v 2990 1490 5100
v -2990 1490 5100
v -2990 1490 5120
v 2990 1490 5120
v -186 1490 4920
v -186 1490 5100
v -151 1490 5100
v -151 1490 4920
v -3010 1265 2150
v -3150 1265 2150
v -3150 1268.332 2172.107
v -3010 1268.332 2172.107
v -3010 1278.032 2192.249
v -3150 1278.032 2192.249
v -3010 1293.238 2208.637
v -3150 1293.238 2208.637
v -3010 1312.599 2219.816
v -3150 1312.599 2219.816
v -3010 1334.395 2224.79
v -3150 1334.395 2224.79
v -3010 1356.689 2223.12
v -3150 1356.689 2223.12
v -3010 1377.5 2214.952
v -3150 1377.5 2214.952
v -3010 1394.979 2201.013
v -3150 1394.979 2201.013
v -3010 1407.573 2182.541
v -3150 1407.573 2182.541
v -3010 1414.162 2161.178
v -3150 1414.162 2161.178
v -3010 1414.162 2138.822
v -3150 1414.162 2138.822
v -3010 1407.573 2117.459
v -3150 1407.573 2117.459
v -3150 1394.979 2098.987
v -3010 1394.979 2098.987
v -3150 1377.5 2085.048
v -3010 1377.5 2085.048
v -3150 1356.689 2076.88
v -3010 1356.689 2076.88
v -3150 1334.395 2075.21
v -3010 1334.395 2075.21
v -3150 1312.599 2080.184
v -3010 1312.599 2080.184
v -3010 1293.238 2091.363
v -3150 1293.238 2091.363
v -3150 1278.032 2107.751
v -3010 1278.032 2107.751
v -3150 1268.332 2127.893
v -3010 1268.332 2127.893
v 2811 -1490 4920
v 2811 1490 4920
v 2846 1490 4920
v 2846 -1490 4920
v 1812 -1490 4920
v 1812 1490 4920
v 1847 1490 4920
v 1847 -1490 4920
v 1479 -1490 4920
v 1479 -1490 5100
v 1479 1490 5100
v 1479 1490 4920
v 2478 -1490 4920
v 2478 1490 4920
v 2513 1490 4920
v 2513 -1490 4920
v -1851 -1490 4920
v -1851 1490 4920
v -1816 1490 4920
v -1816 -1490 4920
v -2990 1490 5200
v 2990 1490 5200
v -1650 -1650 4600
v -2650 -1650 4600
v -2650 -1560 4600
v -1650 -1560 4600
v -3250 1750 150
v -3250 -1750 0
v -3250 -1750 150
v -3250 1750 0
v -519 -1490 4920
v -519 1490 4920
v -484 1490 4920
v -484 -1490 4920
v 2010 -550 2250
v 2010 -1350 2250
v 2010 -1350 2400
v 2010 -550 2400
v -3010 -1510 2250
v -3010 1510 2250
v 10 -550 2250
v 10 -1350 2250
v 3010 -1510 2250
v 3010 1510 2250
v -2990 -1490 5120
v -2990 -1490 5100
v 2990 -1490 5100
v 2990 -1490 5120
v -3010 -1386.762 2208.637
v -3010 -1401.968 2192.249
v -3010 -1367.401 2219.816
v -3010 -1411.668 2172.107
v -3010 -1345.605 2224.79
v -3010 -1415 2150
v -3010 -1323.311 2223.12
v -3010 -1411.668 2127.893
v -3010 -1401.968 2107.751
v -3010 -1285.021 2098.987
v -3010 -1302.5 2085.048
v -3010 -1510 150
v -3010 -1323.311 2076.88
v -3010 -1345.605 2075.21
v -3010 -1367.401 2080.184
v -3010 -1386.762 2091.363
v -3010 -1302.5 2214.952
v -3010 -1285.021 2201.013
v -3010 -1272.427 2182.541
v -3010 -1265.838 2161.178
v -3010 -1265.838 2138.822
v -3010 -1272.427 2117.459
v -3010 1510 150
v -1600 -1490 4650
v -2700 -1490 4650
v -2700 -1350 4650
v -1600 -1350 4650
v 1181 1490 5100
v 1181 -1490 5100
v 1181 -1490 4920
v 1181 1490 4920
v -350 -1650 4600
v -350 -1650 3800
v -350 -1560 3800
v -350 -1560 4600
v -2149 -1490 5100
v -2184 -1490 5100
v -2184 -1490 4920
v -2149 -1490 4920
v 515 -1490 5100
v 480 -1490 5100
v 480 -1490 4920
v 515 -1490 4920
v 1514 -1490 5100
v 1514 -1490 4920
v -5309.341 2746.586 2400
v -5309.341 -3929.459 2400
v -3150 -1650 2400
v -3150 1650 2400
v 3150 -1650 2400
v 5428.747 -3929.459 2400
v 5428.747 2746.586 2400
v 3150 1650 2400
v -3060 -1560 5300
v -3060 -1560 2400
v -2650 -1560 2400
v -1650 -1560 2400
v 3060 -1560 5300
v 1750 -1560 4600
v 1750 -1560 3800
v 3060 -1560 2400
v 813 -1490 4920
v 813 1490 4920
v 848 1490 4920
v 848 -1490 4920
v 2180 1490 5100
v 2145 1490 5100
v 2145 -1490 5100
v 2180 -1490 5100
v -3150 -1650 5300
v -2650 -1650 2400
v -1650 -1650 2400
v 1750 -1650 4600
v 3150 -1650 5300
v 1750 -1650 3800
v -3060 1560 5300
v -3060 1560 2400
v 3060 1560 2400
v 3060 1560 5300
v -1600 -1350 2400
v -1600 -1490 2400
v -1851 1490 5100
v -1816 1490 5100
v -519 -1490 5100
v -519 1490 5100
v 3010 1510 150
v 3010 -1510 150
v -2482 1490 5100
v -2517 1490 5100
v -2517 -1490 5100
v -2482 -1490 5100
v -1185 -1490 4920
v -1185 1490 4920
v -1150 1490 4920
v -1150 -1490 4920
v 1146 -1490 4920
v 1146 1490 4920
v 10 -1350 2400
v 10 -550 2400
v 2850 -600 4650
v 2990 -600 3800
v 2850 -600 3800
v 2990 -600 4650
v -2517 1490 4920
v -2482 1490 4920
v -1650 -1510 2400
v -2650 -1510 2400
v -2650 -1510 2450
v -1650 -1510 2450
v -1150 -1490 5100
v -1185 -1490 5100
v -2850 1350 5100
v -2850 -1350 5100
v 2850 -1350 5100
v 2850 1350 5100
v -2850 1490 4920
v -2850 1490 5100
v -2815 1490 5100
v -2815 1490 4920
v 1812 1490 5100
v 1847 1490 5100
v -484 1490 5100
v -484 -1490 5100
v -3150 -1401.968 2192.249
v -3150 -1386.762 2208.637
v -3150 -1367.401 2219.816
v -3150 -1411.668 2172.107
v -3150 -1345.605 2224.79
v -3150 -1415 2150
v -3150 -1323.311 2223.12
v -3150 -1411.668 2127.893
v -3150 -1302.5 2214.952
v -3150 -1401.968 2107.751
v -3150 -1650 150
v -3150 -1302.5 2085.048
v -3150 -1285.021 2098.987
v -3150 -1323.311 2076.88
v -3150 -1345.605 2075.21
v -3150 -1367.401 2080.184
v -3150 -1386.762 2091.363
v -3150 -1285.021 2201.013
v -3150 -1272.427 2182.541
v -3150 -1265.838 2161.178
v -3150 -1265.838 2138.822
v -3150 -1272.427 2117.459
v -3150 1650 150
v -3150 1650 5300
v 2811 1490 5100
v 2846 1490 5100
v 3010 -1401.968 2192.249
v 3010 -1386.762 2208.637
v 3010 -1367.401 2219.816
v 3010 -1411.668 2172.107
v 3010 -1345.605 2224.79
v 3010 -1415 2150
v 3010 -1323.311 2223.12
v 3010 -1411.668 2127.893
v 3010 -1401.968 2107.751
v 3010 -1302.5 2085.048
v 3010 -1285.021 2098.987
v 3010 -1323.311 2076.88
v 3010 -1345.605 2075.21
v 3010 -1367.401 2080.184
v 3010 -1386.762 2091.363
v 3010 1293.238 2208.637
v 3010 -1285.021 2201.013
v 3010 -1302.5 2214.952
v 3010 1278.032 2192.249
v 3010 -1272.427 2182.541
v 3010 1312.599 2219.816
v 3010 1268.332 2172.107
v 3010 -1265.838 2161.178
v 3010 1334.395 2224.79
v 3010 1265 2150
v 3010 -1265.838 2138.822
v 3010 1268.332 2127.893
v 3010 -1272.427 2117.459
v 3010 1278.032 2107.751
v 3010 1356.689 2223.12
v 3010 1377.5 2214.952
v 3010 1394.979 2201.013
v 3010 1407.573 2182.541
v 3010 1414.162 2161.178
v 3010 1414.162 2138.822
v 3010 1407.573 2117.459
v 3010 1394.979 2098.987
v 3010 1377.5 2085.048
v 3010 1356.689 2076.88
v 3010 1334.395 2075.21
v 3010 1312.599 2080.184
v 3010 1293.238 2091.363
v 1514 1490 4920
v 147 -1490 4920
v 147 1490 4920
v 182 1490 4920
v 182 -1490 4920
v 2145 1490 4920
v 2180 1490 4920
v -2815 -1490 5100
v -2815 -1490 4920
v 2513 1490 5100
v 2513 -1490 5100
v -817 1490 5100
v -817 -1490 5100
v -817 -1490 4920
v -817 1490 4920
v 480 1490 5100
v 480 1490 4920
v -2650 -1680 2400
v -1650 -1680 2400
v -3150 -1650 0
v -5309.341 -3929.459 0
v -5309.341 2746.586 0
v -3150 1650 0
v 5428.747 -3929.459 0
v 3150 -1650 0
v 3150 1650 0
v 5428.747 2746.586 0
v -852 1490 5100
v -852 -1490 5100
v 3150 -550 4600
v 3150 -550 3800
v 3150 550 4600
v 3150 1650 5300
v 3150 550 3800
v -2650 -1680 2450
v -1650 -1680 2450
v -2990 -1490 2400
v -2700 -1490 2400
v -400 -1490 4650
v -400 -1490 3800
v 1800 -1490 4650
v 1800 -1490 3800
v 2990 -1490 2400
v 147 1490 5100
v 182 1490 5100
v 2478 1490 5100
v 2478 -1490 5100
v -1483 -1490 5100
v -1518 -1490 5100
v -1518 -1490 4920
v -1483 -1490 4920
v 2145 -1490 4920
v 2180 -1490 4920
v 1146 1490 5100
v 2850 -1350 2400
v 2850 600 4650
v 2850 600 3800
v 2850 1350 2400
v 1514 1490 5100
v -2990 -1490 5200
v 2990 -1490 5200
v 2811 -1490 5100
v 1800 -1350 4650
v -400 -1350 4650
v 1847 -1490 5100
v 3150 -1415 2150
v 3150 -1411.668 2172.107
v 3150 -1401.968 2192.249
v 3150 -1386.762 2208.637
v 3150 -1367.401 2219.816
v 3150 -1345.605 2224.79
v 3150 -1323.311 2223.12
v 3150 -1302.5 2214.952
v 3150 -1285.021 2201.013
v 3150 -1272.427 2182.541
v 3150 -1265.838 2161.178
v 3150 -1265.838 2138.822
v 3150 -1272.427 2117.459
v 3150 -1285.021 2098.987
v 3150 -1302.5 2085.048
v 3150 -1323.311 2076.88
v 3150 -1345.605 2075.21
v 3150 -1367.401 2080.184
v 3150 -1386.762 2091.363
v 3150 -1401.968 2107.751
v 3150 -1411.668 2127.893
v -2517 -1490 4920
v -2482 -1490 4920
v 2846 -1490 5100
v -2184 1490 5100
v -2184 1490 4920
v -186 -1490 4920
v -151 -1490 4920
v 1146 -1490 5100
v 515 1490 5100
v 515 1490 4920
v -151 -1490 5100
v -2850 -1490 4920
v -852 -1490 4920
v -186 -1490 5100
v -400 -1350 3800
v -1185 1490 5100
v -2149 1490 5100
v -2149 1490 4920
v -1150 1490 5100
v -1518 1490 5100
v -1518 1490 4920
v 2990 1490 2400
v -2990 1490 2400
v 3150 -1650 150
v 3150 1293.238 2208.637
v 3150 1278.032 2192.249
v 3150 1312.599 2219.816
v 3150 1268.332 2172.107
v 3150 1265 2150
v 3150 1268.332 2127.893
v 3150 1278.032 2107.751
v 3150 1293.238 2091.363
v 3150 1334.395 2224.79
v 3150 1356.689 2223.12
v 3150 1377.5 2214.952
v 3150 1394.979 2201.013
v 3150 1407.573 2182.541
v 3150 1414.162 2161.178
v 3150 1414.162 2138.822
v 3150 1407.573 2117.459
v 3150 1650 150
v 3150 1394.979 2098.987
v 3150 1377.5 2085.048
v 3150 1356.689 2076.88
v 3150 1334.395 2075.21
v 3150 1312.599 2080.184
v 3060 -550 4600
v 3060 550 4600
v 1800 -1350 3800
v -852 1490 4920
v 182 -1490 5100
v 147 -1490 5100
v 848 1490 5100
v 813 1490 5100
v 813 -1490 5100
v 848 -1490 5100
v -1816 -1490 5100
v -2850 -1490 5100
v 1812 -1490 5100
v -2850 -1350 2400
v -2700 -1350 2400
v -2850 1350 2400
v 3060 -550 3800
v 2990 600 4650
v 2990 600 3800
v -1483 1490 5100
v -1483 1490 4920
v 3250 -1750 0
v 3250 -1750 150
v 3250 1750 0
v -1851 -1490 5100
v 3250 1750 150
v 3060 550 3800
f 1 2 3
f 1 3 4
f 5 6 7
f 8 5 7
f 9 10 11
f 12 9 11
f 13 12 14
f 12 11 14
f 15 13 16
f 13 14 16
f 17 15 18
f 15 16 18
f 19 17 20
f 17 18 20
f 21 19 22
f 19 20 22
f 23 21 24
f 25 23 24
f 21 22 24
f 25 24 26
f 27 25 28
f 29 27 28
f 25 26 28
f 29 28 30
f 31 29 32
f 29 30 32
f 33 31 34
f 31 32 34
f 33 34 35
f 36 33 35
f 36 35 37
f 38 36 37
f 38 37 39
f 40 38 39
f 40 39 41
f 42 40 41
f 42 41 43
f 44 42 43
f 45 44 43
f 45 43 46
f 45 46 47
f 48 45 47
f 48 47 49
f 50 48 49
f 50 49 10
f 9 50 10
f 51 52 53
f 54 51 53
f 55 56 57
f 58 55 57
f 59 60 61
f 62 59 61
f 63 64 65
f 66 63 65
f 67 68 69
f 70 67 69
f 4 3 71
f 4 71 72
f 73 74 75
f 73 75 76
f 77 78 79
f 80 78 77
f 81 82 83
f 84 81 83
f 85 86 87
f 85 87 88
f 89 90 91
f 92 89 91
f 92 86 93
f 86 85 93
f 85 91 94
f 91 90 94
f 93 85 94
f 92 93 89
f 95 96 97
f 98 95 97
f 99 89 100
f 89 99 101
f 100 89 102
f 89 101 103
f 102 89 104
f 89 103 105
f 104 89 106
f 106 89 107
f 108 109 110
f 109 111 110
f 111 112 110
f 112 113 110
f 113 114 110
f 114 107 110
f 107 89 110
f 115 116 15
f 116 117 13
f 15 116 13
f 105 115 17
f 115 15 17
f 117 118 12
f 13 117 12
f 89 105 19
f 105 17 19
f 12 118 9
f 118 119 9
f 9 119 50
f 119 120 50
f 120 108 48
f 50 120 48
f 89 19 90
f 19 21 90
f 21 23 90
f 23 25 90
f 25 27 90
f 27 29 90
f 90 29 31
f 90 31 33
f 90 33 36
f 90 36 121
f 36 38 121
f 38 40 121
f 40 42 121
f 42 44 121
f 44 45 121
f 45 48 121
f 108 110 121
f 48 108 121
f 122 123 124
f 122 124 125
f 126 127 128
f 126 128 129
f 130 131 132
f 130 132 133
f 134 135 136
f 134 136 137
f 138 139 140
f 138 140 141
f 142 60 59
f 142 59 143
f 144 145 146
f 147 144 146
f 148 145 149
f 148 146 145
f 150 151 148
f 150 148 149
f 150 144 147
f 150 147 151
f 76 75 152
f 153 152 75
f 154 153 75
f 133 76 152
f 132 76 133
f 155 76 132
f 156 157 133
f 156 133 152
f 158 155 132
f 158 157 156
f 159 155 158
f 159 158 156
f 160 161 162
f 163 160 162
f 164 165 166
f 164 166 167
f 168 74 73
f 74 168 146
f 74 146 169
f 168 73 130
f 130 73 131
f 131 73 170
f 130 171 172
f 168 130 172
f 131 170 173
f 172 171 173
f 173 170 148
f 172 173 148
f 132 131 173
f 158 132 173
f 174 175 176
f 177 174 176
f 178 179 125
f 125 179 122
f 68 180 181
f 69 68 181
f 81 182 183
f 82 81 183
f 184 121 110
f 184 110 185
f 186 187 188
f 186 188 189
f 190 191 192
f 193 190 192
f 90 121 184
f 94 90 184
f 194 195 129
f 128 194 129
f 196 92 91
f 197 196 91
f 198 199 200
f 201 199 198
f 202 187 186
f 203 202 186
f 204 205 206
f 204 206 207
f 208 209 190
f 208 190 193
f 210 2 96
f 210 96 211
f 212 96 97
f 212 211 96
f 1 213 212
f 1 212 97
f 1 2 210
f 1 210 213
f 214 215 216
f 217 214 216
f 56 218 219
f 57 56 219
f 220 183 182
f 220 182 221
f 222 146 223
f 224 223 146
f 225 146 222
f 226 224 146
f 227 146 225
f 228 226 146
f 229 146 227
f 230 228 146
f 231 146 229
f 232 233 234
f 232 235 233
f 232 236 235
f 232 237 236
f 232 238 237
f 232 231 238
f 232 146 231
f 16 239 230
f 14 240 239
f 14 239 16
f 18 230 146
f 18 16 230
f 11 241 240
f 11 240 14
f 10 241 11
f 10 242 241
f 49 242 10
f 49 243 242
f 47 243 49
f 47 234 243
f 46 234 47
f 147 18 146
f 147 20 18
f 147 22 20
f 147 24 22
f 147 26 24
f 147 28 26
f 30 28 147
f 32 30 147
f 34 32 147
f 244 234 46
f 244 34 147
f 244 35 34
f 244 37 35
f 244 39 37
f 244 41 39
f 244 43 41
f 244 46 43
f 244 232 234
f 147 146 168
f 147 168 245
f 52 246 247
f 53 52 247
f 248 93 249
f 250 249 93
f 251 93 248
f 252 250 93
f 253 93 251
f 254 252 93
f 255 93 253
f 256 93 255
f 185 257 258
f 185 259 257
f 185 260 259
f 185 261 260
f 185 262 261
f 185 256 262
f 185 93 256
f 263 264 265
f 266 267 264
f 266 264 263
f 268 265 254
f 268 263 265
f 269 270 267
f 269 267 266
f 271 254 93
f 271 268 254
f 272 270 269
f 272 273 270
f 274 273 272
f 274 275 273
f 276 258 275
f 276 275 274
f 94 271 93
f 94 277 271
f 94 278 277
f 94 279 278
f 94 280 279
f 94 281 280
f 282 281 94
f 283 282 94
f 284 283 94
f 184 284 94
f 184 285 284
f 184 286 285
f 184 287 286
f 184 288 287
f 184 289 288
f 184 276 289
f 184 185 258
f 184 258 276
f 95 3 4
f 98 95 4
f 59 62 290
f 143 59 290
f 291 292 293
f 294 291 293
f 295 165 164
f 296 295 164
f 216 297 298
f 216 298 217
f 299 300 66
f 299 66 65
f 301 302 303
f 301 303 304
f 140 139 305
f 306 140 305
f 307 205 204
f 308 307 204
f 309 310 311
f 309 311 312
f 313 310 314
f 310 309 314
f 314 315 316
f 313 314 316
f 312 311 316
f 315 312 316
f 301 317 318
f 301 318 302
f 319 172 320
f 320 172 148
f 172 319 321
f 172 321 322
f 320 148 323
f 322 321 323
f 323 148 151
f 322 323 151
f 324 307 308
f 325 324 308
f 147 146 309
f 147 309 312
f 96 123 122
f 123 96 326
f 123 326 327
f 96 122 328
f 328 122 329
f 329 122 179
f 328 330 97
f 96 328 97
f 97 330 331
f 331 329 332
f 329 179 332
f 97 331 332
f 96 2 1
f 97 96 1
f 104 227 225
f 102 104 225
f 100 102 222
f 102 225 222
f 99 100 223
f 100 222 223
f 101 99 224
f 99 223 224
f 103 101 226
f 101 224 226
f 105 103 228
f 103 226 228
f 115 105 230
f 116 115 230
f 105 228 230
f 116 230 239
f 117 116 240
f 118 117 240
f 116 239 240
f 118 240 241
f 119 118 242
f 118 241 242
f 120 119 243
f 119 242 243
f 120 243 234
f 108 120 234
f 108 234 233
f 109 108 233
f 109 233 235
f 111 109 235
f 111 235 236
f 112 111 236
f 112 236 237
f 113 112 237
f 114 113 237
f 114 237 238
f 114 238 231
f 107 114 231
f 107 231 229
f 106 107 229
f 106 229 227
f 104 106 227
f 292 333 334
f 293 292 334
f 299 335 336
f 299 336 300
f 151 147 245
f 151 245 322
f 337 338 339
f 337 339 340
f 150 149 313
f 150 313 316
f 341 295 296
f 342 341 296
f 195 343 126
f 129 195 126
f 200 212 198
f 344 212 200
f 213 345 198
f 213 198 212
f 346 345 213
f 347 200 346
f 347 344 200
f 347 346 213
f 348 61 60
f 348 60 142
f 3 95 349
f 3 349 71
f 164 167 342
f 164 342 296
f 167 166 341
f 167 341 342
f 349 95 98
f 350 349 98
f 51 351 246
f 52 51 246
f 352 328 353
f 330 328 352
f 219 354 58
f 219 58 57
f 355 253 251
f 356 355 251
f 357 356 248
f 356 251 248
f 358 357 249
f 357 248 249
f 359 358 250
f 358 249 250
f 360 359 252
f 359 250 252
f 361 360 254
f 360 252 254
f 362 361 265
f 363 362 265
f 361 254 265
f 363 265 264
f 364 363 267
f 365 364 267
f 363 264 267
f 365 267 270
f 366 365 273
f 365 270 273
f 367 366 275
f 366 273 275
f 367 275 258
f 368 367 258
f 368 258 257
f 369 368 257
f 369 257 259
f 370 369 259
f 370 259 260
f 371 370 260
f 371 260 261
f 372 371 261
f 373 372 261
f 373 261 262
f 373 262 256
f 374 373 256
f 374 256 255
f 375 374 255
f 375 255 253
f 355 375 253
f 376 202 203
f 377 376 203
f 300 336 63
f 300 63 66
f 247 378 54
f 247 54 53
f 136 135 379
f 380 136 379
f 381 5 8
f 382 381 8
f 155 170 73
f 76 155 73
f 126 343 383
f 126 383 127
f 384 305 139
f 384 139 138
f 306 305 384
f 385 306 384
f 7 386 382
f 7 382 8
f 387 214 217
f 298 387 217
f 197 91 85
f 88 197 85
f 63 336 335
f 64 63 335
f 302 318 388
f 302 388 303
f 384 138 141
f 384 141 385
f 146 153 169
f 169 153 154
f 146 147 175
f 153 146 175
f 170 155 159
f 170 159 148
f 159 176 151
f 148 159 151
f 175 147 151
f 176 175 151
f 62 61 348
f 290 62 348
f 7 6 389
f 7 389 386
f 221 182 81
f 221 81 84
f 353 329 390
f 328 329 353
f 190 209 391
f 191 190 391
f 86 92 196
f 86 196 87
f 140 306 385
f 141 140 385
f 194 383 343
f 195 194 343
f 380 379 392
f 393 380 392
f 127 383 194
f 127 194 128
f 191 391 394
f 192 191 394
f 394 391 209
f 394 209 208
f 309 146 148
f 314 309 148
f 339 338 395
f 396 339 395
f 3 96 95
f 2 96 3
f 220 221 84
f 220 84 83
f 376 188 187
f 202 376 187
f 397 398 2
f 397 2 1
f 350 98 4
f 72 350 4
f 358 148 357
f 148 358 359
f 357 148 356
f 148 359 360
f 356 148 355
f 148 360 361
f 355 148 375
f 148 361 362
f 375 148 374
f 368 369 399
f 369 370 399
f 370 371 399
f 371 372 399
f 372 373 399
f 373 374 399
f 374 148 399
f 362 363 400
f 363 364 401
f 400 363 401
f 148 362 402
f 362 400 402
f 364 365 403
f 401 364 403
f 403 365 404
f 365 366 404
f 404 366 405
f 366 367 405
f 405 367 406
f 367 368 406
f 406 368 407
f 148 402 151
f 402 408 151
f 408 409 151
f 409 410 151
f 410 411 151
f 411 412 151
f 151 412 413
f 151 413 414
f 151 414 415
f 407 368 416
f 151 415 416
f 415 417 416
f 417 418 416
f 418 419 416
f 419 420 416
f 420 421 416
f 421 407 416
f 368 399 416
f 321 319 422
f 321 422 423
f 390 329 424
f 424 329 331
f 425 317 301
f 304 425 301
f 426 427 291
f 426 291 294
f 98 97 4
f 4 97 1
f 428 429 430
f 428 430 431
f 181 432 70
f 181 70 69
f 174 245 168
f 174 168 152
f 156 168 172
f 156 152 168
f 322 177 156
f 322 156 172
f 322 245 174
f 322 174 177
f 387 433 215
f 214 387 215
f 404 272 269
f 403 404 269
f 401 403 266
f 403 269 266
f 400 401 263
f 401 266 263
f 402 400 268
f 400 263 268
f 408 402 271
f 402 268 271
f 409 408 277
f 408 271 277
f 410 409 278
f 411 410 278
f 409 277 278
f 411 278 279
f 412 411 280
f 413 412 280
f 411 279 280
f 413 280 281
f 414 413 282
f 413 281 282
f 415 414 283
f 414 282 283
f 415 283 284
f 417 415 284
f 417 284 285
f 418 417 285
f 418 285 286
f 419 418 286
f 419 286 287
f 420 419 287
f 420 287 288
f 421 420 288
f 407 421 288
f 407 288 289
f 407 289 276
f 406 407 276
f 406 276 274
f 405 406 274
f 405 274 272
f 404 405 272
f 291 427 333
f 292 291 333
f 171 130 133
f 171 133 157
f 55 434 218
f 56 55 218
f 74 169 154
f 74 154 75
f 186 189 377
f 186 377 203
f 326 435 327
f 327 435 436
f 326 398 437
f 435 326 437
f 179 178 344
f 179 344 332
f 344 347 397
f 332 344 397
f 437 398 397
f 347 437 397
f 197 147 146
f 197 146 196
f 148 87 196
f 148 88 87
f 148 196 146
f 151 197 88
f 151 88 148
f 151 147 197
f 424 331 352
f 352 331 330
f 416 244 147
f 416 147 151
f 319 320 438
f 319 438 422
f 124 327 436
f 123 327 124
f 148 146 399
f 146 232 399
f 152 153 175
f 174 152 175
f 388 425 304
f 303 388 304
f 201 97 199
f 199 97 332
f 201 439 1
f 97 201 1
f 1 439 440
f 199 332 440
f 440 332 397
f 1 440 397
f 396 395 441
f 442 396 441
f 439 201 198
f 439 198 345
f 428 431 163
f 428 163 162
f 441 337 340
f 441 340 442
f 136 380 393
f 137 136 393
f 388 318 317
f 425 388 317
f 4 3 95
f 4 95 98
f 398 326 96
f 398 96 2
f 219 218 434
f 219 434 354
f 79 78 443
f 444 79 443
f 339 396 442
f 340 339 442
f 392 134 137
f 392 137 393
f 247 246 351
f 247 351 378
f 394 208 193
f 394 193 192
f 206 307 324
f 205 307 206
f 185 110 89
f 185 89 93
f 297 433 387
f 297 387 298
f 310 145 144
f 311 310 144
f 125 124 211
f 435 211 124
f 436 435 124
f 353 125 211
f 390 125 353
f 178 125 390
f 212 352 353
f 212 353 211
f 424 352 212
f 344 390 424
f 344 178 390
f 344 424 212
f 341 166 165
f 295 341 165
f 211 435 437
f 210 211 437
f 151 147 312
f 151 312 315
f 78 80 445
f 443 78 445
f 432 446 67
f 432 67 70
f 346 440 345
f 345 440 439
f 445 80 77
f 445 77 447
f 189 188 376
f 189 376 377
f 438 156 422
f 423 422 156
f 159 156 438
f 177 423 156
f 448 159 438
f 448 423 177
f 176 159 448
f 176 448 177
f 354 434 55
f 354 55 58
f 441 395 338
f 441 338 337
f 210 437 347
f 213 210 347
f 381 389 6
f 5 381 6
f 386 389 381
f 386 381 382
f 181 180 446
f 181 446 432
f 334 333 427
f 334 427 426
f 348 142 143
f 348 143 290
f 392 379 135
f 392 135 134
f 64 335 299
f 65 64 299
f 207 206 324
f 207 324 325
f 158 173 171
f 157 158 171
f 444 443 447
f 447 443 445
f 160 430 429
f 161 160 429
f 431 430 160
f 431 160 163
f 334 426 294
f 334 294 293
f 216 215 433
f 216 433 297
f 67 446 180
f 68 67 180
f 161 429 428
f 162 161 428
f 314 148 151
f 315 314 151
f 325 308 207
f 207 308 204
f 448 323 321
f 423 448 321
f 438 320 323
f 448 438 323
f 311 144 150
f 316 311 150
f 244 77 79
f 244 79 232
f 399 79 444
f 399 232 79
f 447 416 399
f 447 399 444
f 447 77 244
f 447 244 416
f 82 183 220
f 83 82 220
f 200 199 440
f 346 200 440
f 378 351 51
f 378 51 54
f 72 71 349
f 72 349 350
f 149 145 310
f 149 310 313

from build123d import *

# Parameters (mm, degrees)
F0_W      = 6500
F0_H      = 3500
F1_DEPTH  = 150
F2_W      = 6300
F2_H      = 3300
F2_W_2    = 6020
F2_H_2    = 3020
F3_DEPTH  = 2100
F4_W      = 6300
F4_H      = 3300
F4_W_2    = 2000
F4_H_2    = 800
F5_DEPTH  = 150
F6_R      = 75
F7_DEPTH  = 6400.001
F8_W      = 6300
F8_H      = 3300
F8_W_2    = 6120
F8_H_2    = 3120
F9_DEPTH  = 2900
F10_W     = 5980
F10_H     = 2980
F10_W_2   = 5700
F10_H_2   = 2700
F11_DEPTH = 2700
F12_W     = 1000
F12_H     = 2200
F12_W_2   = 2100
F12_H_2   = 800
F13_DEPTH = 90
F14_W     = 1100
F14_H     = 2250
F14_W_2   = 2200
F14_H_2   = 850
F15_DEPTH = 140
F16_W     = 1100
F16_H     = 800
F17_DEPTH = 90
F18_W     = 1200
F18_H     = 850
F19_DEPTH = 140
F20_W     = 35
F20_H     = 2980
F21_DEPTH = 180
F22_W     = 5980
F22_H     = 2980
F23_DEPTH = 20
F24_W     = 5980
F24_H     = 2980
F25_DEPTH = 80
F26_W     = 1000
F26_H     = 170
F27_DEPTH = 50
F28_W     = 10738.0881309509
F28_H     = 6676.0444641113
F28_W_2   = 6300
F28_H_2   = 3300
F29_DEPTH = 2400


with BuildPart() as f1:
    # F0 (on Top) → F1 (new body)
    with BuildSketch(Plane.XY):
        Rectangle(F0_W, F0_H)
    extrude(amount=F1_DEPTH)

    # F2 (on face) → F3 (join)
    with BuildSketch(Plane.XY.offset(150)):
        Rectangle(F2_W, F2_H)
        Rectangle(F2_W_2, F2_H_2, mode=Mode.SUBTRACT)
    extrude(amount=F3_DEPTH)

    # F4 (on face) → F5 (join)
    with BuildSketch(Plane.XY.offset(2250)):
        Rectangle(F4_W, F4_H)
        with Locations((1010, -950)):
            Rectangle(F4_W_2, F4_H_2, mode=Mode.SUBTRACT)
    extrude(amount=F5_DEPTH)

    # F6 (on face) → F7 (cut, through all)
    with BuildSketch(Plane(origin=(-3150, 0, 0), x_dir=(0, -1, 0), z_dir=(-1, 0, 0))):
        with Locations((-1340, 2150)):
            Circle(F6_R)
        with Locations((1340, 2150)):
            Circle(F6_R)
    extrude(amount=-F7_DEPTH, mode=Mode.SUBTRACT)


with BuildPart() as f9:
    # F8 (on face) → F9 (new body)
    with BuildSketch(Plane.XY.offset(2400)):
        Rectangle(F8_W, F8_H)
        Rectangle(F8_W_2, F8_H_2, mode=Mode.SUBTRACT)
    extrude(amount=F9_DEPTH)

    # F12 (on face) → F13 (cut, through all)
    with BuildSketch(Plane.XZ.offset(1650)):
        with Locations((-2150, 3500)):
            Rectangle(F12_W, F12_H)
        with Locations((700, 4200)):
            Rectangle(F12_W_2, F12_H_2)
    extrude(amount=-F13_DEPTH, mode=Mode.SUBTRACT)

    # F16 (on face) → F17 (cut, through all)
    with BuildSketch(Plane.YZ.offset(3150)):
        with Locations((0, 4200)):
            Rectangle(F16_W, F16_H)
    extrude(amount=-F17_DEPTH, mode=Mode.SUBTRACT)


with BuildPart() as f11:
    # F10 (on face) → F11 (new body)
    with BuildSketch(Plane.XY.offset(2400)):
        Rectangle(F10_W, F10_H)
        Rectangle(F10_W_2, F10_H_2, mode=Mode.SUBTRACT)
    extrude(amount=F11_DEPTH)

    # F14 (on face) → F15 (cut, through all)
    with BuildSketch(Plane.XZ.offset(1490)):
        with Locations((-2150, 3525)):
            Rectangle(F14_W, F14_H)
        with Locations((700, 4225)):
            Rectangle(F14_W_2, F14_H_2)
    extrude(amount=-F15_DEPTH, mode=Mode.SUBTRACT)

    # F18 (on face) → F19 (cut, through all)
    with BuildSketch(Plane.YZ.offset(2990)):
        with Locations((0, 4225)):
            Rectangle(F18_W, F18_H)
    extrude(amount=-F19_DEPTH, mode=Mode.SUBTRACT)


with BuildPart() as f21:
    # F20 (on face) → F21 (new body)
    with BuildSketch(Plane.XY.offset(5100)):
        with Locations((-2832.5, 0)):
            Rectangle(F20_W, F20_H)
    extrude(amount=-F21_DEPTH)


with BuildPart() as f21b:
    # F20 (on face) → F21, piece 2 (new body)
    with BuildSketch(Plane.XY.offset(5100)):
        with Locations((-2499.5, 0)):
            Rectangle(F20_W, F20_H)
    extrude(amount=-F21_DEPTH)


with BuildPart() as f21c:
    # F20 (on face) → F21, piece 3 (new body)
    with BuildSketch(Plane.XY.offset(5100)):
        with Locations((-2166.5, 0)):
            Rectangle(F20_W, F20_H)
    extrude(amount=-F21_DEPTH)


with BuildPart() as f21d:
    # F20 (on face) → F21, piece 4 (new body)
    with BuildSketch(Plane.XY.offset(5100)):
        with Locations((-1833.5, 0)):
            Rectangle(F20_W, F20_H)
    extrude(amount=-F21_DEPTH)


with BuildPart() as f21e:
    # F20 (on face) → F21, piece 5 (new body)
    with BuildSketch(Plane.XY.offset(5100)):
        with Locations((-1500.5, 0)):
            Rectangle(F20_W, F20_H)
    extrude(amount=-F21_DEPTH)


with BuildPart() as f21f:
    # F20 (on face) → F21, piece 6 (new body)
    with BuildSketch(Plane.XY.offset(5100)):
        with Locations((-1167.5, 0)):
            Rectangle(F20_W, F20_H)
    extrude(amount=-F21_DEPTH)


with BuildPart() as f21g:
    # F20 (on face) → F21, piece 7 (new body)
    with BuildSketch(Plane.XY.offset(5100)):
        with Locations((-834.5, 0)):
            Rectangle(F20_W, F20_H)
    extrude(amount=-F21_DEPTH)


with BuildPart() as f21h:
    # F20 (on face) → F21, piece 8 (new body)
    with BuildSketch(Plane.XY.offset(5100)):
        with Locations((-501.5, 0)):
            Rectangle(F20_W, F20_H)
    extrude(amount=-F21_DEPTH)


with BuildPart() as f21i:
    # F20 (on face) → F21, piece 9 (new body)
    with BuildSketch(Plane.XY.offset(5100)):
        with Locations((-168.5, 0)):
            Rectangle(F20_W, F20_H)
    extrude(amount=-F21_DEPTH)


with BuildPart() as f21j:
    # F20 (on face) → F21, piece 10 (new body)
    with BuildSketch(Plane.XY.offset(5100)):
        with Locations((164.5, 0)):
            Rectangle(F20_W, F20_H)
    extrude(amount=-F21_DEPTH)


with BuildPart() as f21k:
    # F20 (on face) → F21, piece 11 (new body)
    with BuildSketch(Plane.XY.offset(5100)):
        with Locations((497.5, 0)):
            Rectangle(F20_W, F20_H)
    extrude(amount=-F21_DEPTH)


with BuildPart() as f21l:
    # F20 (on face) → F21, piece 12 (new body)
    with BuildSketch(Plane.XY.offset(5100)):
        with Locations((830.5, 0)):
            Rectangle(F20_W, F20_H)
    extrude(amount=-F21_DEPTH)


with BuildPart() as f21m:
    # F20 (on face) → F21, piece 13 (new body)
    with BuildSketch(Plane.XY.offset(5100)):
        with Locations((1163.5, 0)):
            Rectangle(F20_W, F20_H)
    extrude(amount=-F21_DEPTH)


with BuildPart() as f21n:
    # F20 (on face) → F21, piece 14 (new body)
    with BuildSketch(Plane.XY.offset(5100)):
        with Locations((1496.5, 0)):
            Rectangle(F20_W, F20_H)
    extrude(amount=-F21_DEPTH)


with BuildPart() as f21o:
    # F20 (on face) → F21, piece 15 (new body)
    with BuildSketch(Plane.XY.offset(5100)):
        with Locations((1829.5, 0)):
            Rectangle(F20_W, F20_H)
    extrude(amount=-F21_DEPTH)


with BuildPart() as f21p:
    # F20 (on face) → F21, piece 16 (new body)
    with BuildSketch(Plane.XY.offset(5100)):
        with Locations((2162.5, 0)):
            Rectangle(F20_W, F20_H)
    extrude(amount=-F21_DEPTH)


with BuildPart() as f21q:
    # F20 (on face) → F21, piece 17 (new body)
    with BuildSketch(Plane.XY.offset(5100)):
        with Locations((2495.5, 0)):
            Rectangle(F20_W, F20_H)
    extrude(amount=-F21_DEPTH)


with BuildPart() as f21r:
    # F20 (on face) → F21, piece 18 (new body)
    with BuildSketch(Plane.XY.offset(5100)):
        with Locations((2828.5, 0)):
            Rectangle(F20_W, F20_H)
    extrude(amount=-F21_DEPTH)


with BuildPart() as f23:
    # F22 (on face) → F23 (new body)
    with BuildSketch(Plane.XY.offset(5100)):
        Rectangle(F22_W, F22_H)
    extrude(amount=F23_DEPTH)


with BuildPart() as f25:
    # F24 (on face) → F25 (new body)
    with BuildSketch(Plane.XY.offset(5120)):
        Rectangle(F24_W, F24_H)
    extrude(amount=F25_DEPTH)


with BuildPart() as f27:
    # F26 (on face) → F27 (new body)
    with BuildSketch(Plane.XY.offset(2400)):
        with Locations((-2150, -1595)):
            Rectangle(F26_W, F26_H)
    extrude(amount=F27_DEPTH)


with BuildPart() as f29:
    # F28 (on face) → F29 (new body)
    with BuildSketch(Plane.XY.offset(2400)):
        with Locations((59.7026348114, -591.4363861084)):
            Rectangle(F28_W, F28_H)
        Rectangle(F28_W_2, F28_H_2, mode=Mode.SUBTRACT)
    extrude(amount=-F29_DEPTH)


solid = Compound([f1.part, f9.part, f11.part, f21.part, f21b.part, f21c.part, f21d.part, f21e.part, f21f.part, f21g.part, f21h.part, f21i.part, f21j.part, f21k.part, f21l.part, f21m.part, f21n.part, f21o.part, f21p.part, f21q.part, f21r.part, f23.part, f25.part, f27.part, f29.part])
